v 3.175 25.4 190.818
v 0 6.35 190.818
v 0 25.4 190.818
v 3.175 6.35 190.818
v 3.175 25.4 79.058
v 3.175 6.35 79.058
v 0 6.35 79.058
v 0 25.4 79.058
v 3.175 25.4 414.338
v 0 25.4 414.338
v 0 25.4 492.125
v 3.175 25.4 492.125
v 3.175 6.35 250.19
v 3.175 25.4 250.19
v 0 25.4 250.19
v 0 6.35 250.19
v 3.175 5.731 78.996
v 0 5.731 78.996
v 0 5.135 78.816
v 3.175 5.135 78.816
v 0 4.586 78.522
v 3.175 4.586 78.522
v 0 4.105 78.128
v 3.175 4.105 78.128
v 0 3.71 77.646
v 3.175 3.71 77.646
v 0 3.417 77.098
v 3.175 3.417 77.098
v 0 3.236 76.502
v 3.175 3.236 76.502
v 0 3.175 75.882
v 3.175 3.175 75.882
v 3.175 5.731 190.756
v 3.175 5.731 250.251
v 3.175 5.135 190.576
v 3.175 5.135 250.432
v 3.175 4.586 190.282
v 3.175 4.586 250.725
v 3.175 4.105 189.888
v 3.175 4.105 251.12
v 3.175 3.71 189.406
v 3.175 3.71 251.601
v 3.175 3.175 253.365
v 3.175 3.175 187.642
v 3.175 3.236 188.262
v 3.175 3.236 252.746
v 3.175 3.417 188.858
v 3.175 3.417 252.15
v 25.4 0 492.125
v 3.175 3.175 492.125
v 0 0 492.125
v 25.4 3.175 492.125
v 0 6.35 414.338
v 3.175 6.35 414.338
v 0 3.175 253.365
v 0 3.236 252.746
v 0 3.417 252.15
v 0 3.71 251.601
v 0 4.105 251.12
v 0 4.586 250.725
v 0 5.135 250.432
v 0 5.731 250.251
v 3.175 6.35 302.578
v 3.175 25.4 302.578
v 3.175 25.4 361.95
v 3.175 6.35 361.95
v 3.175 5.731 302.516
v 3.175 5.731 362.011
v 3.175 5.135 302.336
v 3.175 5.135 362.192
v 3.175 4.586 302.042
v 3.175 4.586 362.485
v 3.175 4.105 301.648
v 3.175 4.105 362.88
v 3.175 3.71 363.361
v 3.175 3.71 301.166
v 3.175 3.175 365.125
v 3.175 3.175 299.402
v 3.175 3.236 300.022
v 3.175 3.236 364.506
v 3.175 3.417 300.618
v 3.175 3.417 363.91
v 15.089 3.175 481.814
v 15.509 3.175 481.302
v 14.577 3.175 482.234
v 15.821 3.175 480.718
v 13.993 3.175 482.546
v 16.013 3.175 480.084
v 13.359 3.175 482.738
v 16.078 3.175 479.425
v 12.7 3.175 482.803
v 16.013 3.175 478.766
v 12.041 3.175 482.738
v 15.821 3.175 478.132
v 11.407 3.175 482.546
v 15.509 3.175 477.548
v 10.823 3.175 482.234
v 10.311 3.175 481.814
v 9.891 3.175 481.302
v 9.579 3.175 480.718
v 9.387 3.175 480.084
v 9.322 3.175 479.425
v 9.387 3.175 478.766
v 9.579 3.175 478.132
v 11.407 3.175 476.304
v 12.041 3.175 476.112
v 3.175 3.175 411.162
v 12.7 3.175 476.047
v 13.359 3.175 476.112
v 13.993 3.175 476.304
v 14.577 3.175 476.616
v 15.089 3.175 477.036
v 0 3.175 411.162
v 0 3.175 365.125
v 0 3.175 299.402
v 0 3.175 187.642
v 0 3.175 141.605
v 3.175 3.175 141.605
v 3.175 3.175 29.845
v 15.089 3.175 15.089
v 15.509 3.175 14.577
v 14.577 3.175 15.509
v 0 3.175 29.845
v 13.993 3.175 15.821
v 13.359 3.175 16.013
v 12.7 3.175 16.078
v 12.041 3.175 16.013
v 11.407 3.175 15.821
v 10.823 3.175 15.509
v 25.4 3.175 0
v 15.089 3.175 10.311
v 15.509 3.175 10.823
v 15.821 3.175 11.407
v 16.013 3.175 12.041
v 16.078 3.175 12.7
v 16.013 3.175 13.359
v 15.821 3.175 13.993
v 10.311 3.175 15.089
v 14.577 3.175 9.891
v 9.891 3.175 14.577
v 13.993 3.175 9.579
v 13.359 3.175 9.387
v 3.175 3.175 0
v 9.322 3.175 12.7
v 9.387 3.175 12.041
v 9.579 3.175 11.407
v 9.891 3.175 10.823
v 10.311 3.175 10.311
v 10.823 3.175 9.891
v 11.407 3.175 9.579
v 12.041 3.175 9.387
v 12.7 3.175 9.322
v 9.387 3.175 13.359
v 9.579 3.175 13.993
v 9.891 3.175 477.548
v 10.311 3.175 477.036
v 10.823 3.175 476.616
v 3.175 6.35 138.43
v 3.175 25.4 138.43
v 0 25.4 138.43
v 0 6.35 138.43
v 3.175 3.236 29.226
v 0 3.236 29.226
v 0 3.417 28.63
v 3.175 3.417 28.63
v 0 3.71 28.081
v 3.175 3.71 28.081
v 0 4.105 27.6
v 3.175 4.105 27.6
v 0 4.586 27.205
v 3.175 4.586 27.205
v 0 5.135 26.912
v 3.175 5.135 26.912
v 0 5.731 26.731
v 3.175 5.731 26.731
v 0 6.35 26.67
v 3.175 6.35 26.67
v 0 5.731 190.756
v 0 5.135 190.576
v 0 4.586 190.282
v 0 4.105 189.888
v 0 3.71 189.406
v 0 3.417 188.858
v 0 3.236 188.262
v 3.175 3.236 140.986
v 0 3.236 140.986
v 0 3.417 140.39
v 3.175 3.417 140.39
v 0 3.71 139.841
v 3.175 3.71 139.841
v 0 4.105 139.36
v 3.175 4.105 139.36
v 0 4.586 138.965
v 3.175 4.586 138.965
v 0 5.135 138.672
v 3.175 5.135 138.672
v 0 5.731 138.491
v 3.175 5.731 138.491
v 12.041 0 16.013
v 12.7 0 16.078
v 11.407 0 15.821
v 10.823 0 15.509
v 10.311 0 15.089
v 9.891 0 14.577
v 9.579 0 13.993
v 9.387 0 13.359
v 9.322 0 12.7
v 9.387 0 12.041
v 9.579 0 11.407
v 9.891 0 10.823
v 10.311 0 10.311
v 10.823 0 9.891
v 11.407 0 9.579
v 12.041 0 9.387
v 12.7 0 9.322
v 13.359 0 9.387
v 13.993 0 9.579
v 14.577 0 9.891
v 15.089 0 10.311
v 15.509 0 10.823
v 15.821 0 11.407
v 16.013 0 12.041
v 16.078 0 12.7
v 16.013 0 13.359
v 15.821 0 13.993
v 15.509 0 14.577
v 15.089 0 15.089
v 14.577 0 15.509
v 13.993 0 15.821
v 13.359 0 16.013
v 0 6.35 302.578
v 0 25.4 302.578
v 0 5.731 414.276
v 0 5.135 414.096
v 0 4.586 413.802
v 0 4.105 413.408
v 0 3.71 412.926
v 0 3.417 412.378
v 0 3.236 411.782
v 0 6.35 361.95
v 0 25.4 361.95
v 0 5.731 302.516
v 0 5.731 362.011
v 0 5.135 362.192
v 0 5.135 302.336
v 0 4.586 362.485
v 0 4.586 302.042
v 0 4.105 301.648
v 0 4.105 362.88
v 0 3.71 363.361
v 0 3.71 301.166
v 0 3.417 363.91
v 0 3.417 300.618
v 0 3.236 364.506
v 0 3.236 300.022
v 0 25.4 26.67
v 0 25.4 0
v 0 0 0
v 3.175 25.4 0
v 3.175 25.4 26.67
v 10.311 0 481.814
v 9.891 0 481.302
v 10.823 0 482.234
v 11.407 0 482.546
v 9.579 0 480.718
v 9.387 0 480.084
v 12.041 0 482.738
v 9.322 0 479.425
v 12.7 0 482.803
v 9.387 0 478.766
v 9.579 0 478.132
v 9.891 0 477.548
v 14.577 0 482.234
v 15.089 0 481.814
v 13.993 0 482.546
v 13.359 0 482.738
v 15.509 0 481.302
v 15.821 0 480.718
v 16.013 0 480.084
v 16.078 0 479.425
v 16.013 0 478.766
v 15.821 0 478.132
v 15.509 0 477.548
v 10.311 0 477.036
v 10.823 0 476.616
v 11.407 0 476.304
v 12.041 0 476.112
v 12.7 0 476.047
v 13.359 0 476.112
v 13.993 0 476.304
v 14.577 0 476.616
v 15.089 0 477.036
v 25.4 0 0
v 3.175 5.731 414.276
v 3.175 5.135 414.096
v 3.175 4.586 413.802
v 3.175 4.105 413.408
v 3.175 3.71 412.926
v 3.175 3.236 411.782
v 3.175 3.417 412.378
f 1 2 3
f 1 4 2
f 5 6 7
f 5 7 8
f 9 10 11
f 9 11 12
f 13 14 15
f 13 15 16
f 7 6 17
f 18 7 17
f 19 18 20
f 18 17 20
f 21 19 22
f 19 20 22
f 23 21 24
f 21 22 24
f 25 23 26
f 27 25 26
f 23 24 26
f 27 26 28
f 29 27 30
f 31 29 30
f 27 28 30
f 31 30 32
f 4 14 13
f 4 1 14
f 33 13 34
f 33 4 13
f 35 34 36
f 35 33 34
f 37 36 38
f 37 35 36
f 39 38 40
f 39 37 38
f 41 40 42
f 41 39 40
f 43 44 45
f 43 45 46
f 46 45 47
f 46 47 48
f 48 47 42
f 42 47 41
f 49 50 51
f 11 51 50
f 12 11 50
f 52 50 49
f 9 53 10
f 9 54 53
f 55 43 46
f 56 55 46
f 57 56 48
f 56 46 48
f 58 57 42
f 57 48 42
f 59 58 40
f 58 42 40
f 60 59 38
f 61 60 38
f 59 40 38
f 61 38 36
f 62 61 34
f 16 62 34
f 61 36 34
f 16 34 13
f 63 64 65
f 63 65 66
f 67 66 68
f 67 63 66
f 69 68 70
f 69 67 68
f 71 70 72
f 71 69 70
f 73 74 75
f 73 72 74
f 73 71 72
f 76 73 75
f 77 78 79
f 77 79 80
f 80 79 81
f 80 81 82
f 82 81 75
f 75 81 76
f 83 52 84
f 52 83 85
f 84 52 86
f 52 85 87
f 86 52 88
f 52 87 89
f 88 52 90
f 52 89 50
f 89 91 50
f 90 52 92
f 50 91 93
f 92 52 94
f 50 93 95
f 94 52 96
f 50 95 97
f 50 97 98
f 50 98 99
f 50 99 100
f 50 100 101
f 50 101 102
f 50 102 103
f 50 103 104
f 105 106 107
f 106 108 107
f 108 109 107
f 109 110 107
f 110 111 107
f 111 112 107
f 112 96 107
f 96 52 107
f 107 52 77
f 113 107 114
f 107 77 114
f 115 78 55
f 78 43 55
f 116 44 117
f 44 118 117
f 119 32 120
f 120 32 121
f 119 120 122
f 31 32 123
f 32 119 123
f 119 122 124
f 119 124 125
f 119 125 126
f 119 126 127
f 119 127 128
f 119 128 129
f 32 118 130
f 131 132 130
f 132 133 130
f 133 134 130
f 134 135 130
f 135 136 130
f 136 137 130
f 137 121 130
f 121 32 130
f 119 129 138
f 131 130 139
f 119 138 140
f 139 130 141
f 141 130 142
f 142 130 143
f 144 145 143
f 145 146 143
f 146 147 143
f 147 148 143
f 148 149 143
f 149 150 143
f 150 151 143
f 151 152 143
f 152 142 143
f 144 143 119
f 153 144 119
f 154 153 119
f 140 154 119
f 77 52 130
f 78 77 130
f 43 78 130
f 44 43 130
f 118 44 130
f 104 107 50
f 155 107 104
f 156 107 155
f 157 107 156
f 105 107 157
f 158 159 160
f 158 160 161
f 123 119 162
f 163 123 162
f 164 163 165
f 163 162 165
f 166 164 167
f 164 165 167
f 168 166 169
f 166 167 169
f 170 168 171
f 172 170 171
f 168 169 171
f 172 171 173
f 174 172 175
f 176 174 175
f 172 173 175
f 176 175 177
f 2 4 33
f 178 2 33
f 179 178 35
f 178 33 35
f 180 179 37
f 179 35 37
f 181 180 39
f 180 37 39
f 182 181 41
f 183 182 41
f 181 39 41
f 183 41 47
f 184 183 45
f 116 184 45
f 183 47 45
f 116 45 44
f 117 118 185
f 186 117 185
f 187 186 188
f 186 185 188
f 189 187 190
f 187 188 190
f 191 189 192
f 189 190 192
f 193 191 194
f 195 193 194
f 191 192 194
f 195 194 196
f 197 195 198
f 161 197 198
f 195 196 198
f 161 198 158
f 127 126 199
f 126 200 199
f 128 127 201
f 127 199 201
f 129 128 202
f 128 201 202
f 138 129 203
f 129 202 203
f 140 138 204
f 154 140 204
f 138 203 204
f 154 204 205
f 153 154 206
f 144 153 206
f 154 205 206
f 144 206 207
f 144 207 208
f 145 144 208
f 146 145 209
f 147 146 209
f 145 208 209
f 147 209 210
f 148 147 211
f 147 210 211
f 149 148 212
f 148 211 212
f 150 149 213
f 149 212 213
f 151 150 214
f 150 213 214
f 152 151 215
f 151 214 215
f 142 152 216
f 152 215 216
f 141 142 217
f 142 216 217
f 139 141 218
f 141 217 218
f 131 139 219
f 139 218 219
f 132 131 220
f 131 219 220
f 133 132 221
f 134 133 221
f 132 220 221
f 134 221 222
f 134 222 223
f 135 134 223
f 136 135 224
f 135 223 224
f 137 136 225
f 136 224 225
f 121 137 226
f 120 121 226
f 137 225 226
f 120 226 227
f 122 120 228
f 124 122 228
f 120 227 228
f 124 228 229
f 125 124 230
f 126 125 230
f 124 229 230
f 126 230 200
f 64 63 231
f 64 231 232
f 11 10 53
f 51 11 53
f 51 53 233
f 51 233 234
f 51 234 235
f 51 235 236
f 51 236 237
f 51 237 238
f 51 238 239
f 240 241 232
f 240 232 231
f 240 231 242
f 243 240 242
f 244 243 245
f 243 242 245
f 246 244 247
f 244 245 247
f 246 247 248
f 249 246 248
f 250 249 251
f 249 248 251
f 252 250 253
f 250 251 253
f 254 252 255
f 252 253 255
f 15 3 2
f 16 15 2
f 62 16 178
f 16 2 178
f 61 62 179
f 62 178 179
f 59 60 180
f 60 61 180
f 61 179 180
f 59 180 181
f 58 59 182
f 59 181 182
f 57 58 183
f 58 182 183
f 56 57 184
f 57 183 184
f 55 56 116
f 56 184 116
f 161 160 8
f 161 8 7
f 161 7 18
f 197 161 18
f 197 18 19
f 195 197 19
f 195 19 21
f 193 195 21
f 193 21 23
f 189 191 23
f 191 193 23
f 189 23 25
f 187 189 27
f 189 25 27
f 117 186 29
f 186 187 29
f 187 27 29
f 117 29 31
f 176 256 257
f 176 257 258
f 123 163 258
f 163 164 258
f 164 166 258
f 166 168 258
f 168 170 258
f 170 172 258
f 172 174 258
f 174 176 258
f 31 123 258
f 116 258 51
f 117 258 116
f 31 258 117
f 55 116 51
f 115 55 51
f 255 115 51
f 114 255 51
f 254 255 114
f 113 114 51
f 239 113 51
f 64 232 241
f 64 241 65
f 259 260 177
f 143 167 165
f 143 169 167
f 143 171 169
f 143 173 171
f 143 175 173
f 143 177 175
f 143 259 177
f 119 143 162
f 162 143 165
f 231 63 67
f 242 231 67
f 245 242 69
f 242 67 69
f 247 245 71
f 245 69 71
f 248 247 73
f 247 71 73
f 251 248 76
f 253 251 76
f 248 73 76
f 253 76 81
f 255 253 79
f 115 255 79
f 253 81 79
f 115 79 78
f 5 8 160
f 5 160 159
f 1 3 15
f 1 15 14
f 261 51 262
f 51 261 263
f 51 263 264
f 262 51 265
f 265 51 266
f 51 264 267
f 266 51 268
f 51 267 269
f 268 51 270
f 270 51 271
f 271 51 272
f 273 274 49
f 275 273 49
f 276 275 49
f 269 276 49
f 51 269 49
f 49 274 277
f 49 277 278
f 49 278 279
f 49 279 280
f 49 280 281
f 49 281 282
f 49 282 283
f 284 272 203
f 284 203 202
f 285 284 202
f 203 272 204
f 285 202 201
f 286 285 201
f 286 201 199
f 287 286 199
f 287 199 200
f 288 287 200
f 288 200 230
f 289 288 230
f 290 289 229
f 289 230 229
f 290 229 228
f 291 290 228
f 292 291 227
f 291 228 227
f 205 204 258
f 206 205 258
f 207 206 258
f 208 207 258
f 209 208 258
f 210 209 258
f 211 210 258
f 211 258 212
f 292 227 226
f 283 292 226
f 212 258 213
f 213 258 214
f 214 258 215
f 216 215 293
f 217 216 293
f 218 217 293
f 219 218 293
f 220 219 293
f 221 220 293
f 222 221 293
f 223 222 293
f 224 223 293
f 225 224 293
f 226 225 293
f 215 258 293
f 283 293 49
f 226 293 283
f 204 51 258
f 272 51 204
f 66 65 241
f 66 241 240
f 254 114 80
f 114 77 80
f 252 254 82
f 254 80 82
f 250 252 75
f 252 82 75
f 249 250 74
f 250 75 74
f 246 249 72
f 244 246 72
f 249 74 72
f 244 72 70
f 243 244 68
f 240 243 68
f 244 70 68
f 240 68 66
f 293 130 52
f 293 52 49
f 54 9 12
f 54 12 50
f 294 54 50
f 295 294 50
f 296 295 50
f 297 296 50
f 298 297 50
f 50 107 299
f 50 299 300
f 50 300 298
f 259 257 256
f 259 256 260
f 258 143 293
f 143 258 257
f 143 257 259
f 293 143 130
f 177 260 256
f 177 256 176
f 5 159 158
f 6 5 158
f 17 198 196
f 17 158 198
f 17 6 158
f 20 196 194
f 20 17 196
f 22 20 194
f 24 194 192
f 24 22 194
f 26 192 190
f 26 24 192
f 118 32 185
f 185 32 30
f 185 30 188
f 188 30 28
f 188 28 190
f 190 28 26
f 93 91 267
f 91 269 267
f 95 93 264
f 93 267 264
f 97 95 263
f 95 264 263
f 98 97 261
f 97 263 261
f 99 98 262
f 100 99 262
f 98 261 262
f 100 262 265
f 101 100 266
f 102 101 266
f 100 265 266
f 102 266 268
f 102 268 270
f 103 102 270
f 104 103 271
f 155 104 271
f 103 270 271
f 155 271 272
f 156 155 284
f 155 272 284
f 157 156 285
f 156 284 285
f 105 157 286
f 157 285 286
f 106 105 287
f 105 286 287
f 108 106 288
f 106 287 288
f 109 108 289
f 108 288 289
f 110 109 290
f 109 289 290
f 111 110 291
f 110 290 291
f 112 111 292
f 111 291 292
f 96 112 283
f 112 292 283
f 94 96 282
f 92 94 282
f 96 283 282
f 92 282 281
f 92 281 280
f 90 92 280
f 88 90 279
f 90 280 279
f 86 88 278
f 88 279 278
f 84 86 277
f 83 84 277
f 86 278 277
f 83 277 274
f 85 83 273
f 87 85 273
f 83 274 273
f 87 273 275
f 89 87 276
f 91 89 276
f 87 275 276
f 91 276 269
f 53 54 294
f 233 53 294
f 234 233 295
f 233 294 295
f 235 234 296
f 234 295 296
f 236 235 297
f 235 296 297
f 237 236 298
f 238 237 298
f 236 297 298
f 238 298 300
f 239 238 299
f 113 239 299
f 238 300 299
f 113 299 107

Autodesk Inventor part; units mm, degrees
ref_plane "YZ Plane" through (0, 0, 0) normal (1, 0, 0) x (0, 1, 0)
ref_plane "XZ Plane" through (0, 0, 0) normal (0, 1, 0) x (-1, 0, 0)
ref_plane "XY Plane" through (0, 0, 0) normal (0, 0, 1) x (1, 0, 0)
sketch "Sketch1" plane through (0, 0, 0) normal (0, 0, 1) x (1, 0, 0)
  line L0 (0, 25.4) -> (0, 0)
  line L1 (0, 0) -> (25.4, 0)
  line L2 (3.175, 25.4) -> (3.175, 4.953)
  line L3 (4.953, 3.175) -> (25.4, 3.175)
  line L4 (0, 25.4) -> (3.175, 25.4)
  line L5 (25.4, 3.175) -> (25.4, 0)
  line L6 (3.175, 4.953) -> (3.175, 3.175)
  line L7 (4.953, 3.175) -> (3.175, 3.175)
  dimension "d0" = 25.4
  dimension "d1" = 25.4
  dimension "d2" = 3.175
extrude "Extrusion1" add sketch "Sketch1" along normal blind 492.125
sketch "Sketch2" plane through (3.175, 3.175, 0) normal (0, 1, 0) x (1, 0, 0)
  circle A0 centre (9.525, -479.425) radius 2.8398
  line L0 (22.225, -492.125) -> (0, -492.125) projected
  line L1 (22.225, 0) -> (22.225, -492.125) projected
  circle A1 centre (9.525, -12.7) radius 2.8398
  line L2 (22.225, 0) -> (0, 0) projected
  point P0 (-3.175, 0)
  point P1 (1.778, -492.125)
  point P2 (1.778, 0)
  dimension "d5" = 12.7
  dimension "d6" = 12.7
  dimension "d9" = 466.725
  dimension "d31" = 12.7
hole "Hole1" at (12.7, 3.175, 479.425) at (12.7, 3.175, 12.7) direction (0, -1, 0) diameter 6.7564 depth 25.4 tip angle 118 clearance for "Flat Head Machine Screw (82)" size "1/4" standard "Ansi Unified Screw Threads"
sketch "Sketch22" plane through (3.175, 3.175, 0) normal (1, 0, 0) x (0, 0, -1)
  line L0 (0, 22.225) -> (-492.125, 22.225) projected
  line L1 (0, 0) -> (-492.125, 0) projected
  line L2 (-414.3375, 22.225) -> (-361.95, 22.225)
  line L3 (-361.95, 22.225) -> (-361.95, 3.175)
  line L4 (-365.125, 0) -> (-411.1625, 0)
  line L5 (-414.3375, 3.175) -> (-414.3375, 22.225)
  line L6 (-492.125, 0) -> (-492.125, 22.225) projected
  arc A0 (-414.3375, 3.175) -> (-411.1625, 0) centre (-411.1625, 3.175) ccw
  arc A1 (-365.125, 0) -> (-361.95, 3.175) centre (-365.125, 3.175) ccw
  point P0 (0, -3.175)
  point P1 (-361.95, 0)
  point P2 (-414.3375, 0)
  dimension "d137" = 52.3875
  dimension "d138" = 77.7875
  dimension "d139" = 3.175
extrude "Extrusion11" cut sketch "Sketch22" against normal blind 25.4 contours L3 A1 L1 A0 L5 L0
pattern_linear "Rectangular Pattern1" count 4 spacing 111.76 along (0, 0, -1) of "Extrusion11"
